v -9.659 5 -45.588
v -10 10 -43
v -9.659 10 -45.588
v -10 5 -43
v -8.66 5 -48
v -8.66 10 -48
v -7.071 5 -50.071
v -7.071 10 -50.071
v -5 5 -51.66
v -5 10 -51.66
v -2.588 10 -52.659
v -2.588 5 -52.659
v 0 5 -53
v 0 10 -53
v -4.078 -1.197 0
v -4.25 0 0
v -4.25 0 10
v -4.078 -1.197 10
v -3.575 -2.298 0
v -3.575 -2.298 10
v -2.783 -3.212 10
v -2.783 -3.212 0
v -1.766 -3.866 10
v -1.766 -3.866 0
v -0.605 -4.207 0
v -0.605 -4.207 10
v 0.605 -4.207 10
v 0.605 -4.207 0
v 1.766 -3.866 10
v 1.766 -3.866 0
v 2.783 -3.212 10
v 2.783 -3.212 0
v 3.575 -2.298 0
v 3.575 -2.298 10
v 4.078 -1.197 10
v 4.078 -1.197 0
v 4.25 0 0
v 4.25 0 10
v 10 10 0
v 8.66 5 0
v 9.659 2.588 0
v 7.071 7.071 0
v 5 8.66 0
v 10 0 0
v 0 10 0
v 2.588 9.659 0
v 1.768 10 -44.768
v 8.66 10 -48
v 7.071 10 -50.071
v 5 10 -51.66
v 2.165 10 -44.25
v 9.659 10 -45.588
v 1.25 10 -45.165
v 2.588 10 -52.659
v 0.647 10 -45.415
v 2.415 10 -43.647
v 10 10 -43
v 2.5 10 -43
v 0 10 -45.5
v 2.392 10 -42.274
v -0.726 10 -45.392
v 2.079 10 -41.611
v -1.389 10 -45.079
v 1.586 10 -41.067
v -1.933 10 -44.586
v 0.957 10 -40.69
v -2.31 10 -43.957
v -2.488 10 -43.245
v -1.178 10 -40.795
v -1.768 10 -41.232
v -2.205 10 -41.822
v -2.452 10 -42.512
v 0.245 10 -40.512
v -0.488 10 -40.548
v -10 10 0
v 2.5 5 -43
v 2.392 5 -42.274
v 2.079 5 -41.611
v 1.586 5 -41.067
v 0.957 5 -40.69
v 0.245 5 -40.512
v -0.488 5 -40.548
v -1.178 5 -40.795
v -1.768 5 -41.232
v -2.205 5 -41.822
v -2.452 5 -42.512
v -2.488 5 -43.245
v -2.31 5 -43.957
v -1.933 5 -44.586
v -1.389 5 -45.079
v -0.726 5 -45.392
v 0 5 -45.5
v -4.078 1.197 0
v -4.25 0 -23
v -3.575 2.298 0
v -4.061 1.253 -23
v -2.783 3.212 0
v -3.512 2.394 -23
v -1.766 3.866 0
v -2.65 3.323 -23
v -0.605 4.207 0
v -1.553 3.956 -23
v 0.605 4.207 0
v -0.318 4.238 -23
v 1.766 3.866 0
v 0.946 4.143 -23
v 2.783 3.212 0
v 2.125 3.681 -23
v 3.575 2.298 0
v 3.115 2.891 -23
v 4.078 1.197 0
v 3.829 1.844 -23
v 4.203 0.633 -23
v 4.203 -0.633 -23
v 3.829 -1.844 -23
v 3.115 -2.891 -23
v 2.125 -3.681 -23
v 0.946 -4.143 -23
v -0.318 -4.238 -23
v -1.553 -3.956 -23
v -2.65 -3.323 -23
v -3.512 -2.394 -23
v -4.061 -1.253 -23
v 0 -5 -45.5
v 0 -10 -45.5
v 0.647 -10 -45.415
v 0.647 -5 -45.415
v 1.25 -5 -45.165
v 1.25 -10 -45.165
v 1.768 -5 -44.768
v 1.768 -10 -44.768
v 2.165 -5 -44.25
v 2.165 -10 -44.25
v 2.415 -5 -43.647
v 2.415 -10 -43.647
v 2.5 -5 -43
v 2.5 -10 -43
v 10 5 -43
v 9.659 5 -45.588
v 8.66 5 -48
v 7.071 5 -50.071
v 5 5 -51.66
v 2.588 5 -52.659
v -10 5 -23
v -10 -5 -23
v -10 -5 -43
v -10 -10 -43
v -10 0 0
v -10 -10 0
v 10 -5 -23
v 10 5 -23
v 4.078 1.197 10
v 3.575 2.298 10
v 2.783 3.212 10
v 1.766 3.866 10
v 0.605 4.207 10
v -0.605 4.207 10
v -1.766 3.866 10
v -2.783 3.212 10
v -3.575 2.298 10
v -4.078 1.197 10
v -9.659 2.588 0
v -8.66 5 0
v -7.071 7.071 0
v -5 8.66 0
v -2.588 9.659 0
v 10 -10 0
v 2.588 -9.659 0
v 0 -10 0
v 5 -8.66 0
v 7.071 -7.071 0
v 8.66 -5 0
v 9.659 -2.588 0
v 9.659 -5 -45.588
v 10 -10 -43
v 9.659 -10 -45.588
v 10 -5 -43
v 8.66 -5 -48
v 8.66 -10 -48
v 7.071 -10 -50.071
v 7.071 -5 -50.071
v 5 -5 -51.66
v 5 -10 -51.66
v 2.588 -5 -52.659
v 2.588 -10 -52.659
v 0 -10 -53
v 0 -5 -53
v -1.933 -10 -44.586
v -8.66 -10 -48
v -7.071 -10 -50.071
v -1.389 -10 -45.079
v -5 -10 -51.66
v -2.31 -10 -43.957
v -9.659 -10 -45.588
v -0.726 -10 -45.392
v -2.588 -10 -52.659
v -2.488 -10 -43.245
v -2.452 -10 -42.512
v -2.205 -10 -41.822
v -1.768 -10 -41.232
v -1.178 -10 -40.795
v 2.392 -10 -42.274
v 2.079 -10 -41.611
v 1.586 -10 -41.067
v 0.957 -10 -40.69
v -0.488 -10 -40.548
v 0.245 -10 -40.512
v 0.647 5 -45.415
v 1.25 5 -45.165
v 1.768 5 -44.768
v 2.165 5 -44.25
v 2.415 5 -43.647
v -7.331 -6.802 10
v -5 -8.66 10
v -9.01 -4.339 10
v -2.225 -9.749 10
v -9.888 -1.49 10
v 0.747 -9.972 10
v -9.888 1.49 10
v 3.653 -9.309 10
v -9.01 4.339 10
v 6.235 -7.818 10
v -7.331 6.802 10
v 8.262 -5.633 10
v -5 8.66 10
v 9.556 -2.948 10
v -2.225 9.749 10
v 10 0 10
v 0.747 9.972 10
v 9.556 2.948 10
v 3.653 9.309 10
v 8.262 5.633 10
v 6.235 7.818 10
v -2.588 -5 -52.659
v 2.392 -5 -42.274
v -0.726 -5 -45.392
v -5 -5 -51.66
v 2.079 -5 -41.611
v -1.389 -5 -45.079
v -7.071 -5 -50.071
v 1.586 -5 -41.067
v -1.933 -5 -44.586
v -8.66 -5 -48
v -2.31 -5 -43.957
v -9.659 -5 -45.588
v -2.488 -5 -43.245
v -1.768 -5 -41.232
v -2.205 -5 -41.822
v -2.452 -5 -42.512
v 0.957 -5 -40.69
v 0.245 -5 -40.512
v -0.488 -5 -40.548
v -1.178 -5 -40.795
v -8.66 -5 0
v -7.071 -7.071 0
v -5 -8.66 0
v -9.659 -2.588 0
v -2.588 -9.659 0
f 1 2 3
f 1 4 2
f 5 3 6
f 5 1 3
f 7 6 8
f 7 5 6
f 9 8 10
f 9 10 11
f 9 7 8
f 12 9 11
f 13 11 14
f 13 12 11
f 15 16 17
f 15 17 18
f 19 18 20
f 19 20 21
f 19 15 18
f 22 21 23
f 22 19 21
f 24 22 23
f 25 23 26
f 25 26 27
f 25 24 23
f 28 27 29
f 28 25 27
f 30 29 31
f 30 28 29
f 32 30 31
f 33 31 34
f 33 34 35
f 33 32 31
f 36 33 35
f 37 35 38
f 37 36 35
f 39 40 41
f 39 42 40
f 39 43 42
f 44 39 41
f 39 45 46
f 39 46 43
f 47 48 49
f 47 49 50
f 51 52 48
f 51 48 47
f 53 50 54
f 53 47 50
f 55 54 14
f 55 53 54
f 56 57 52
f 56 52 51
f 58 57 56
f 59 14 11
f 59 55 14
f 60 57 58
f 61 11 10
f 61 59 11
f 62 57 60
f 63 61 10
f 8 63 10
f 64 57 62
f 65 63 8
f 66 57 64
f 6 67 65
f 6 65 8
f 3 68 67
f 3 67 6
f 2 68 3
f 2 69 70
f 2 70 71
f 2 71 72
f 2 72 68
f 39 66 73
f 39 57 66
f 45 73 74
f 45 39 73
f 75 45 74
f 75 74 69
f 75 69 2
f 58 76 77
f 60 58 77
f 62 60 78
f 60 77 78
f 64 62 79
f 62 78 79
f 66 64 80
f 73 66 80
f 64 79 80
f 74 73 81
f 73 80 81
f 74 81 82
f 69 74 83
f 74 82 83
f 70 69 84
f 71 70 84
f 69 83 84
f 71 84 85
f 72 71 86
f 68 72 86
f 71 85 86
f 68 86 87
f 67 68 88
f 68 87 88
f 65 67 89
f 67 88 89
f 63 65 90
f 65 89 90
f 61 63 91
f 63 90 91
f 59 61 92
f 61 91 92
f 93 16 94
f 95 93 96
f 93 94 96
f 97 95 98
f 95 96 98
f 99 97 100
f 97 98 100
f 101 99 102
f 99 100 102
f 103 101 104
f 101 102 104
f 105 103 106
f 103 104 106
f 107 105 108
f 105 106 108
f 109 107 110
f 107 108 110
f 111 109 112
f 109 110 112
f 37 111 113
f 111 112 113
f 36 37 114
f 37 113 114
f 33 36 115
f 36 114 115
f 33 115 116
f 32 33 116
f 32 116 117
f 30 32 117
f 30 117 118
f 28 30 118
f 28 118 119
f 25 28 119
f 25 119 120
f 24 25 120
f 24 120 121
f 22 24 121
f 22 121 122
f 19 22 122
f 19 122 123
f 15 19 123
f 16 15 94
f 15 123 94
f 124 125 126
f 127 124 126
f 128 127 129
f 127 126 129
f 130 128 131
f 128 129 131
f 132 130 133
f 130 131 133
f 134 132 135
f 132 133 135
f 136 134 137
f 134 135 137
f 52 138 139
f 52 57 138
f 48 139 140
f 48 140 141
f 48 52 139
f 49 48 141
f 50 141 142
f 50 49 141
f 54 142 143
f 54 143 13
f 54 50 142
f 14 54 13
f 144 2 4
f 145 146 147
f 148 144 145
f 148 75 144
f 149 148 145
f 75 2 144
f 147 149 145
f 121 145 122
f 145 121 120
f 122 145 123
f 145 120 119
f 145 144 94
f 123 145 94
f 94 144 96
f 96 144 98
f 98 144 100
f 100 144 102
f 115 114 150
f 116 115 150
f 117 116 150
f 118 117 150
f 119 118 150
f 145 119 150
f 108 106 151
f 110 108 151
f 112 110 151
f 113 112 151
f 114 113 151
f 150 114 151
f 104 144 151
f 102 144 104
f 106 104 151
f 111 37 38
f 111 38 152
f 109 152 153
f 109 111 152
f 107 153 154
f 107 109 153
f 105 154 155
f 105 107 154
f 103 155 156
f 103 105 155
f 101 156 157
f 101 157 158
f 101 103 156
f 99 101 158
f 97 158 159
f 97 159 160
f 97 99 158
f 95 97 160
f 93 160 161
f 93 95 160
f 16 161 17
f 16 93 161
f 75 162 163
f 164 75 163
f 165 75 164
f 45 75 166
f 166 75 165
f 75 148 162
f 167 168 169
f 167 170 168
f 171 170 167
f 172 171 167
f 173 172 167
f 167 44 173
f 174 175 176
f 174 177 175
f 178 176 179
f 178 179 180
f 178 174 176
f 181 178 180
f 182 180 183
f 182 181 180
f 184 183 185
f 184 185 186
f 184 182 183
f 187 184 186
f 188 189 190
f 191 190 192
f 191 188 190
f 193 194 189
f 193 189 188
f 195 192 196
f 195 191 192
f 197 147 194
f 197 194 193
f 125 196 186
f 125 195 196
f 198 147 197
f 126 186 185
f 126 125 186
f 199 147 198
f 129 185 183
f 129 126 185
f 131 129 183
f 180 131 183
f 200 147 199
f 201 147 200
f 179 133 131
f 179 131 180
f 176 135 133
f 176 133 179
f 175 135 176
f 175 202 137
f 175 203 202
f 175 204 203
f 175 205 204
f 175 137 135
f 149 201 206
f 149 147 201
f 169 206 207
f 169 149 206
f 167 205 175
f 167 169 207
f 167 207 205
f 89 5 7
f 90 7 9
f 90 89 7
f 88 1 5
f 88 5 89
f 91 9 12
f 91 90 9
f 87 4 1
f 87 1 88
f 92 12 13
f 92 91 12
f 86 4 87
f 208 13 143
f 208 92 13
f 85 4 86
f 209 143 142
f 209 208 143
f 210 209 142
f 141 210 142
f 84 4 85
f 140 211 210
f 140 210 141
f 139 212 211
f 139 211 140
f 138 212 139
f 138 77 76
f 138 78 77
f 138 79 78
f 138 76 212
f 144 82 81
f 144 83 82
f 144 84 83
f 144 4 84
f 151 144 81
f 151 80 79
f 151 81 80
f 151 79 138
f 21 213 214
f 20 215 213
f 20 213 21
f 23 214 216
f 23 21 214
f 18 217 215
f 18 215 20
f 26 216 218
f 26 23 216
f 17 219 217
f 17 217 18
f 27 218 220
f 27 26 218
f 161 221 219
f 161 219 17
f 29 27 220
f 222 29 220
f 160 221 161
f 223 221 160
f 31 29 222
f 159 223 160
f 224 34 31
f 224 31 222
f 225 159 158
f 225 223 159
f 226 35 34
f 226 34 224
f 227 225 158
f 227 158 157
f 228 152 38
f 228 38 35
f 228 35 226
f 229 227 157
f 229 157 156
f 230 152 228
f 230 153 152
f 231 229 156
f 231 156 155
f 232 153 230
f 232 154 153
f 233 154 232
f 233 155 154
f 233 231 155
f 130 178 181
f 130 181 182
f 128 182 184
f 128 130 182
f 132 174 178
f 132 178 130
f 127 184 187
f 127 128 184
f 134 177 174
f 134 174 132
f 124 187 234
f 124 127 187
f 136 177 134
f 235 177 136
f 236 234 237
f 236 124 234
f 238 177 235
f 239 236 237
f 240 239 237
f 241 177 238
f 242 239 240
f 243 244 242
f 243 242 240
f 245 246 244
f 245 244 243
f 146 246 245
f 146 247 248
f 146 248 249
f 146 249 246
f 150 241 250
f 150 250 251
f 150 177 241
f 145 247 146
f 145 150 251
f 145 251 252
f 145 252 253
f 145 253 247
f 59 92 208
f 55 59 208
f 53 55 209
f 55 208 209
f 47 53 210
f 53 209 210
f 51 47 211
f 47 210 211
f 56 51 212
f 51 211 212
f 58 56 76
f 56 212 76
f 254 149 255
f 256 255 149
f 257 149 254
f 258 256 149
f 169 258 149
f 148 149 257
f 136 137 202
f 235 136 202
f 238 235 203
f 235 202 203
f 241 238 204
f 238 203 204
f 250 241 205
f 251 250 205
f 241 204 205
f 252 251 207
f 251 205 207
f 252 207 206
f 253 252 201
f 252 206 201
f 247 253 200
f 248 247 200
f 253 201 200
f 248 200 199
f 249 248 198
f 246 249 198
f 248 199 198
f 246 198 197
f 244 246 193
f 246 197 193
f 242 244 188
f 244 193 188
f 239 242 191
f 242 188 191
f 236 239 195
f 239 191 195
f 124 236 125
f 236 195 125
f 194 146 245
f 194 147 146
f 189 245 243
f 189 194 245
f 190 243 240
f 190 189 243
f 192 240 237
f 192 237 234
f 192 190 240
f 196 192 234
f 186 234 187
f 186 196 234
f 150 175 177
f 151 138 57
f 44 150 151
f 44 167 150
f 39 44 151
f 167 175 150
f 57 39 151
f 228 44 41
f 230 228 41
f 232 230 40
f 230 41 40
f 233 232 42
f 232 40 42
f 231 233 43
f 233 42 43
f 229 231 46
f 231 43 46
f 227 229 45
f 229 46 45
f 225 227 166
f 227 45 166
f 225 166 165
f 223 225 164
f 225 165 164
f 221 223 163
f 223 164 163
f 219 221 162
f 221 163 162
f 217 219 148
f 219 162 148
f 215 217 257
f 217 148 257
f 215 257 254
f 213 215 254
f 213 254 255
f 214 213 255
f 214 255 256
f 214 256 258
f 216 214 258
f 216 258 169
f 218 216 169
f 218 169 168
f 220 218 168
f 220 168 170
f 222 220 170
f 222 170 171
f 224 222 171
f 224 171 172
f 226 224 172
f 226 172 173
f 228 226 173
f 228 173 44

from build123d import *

# Parameters (mm, degrees)
F0_R     = 10
F0_R_2   = 4.25
F1_DEPTH = 10
F3_DEPTH = 53
F5_DEPTH = 25
F6_DEPTH = 23
F7_R     = 9.99999
F8_D     = 8.5


# Not quite as in the source:
# - a fillet or chamfer is up to 0.001 mm smaller than in the source, because OpenCascade refuses the exact size
# - a feature names something its author has since deleted; it is built from what else it names


with BuildPart() as f1:
    # F0 (on Top) → F1 (new body)
    with BuildSketch(Plane.XY):
        Circle(F0_R)
        Circle(F0_R_2, mode=Mode.SUBTRACT)
    extrude(amount=F1_DEPTH)

    # F2 (on face) → F3 (join)
    with BuildSketch(Plane.XY):
        with BuildLine():
            ThreePointArc((8.6602540378, -5), (5, -8.6602540378), (0, -10))
            Line((0, -10), (10, -10))
            Line((10, -10), (10, -5))
            Line((10, -5), (8.6602540378, -5))
        make_face()
        with BuildLine():
            ThreePointArc((-8.6602540378, -5), (-5, -8.6602540378), (0, -10))
            ThreePointArc((0, -10), (5, -8.6602540378), (8.6602540378, -5))
            Line((8.6602540378, -5), (-8.6602540378, -5))
        make_face()
        with BuildLine():
            Line((-10, -10), (0, -10))
            ThreePointArc((0, -10), (-5, -8.6602540378), (-8.6602540378, -5))
            Line((-8.6602540378, -5), (-10, -5))
            Line((-10, -5), (-10, -10))
        make_face()
        with BuildLine():
            Line((8.6602540378, 5), (10, 5))
            Line((10, 5), (10, 10))
            Line((10, 10), (-2.67e-08, 10))
            ThreePointArc((-2.67e-08, 10), (4.9999999884, 8.6602540445), (8.6602540378, 5))
        make_face()
        with BuildLine():
            Line((-10, 10), (-10, 5))
            Line((-10, 5), (-8.6602540378, 5))
            ThreePointArc((-8.6602540378, 5), (-5.0000000116, 8.6602540312), (-2.67e-08, 10))
            Line((-2.67e-08, 10), (-10, 10))
        make_face()
        with BuildLine():
            ThreePointArc((-2.67e-08, 10), (-5.0000000116, 8.6602540312), (-8.6602540378, 5))
            Line((-8.6602540378, 5), (8.6602540378, 5))
            ThreePointArc((8.6602540378, 5), (4.9999999884, 8.6602540445), (-2.67e-08, 10))
        make_face()
    extrude(amount=-F3_DEPTH)

    # F4 (on face) → F5 (cut)
    with BuildSketch(Plane.XZ.offset(10)):
        with BuildLine():
            ThreePointArc((2.5, -43), (-1.767766953, -41.232233047), (0, -45.5))
            ThreePointArc((0, -45.5), (1.767766953, -44.767766953), (2.5, -43))
        make_face()
    extrude(amount=-F5_DEPTH, mode=Mode.SUBTRACT)

    # F2 (on face) → F6 (join)
    with BuildSketch(Plane.XY):
        with BuildLine():
            ThreePointArc((4.25, 0), (0, 4.25), (-4.25, 0))
            Line((-4.25, 0), (4.25, 0))
        make_face()
        with BuildLine():
            ThreePointArc((-10, 0), (-9.6592582629, -2.588190451), (-8.6602540378, -5))
            Line((-8.6602540378, -5), (8.6602540378, -5))
            ThreePointArc((8.6602540378, -5), (9.6592582629, -2.588190451), (10, 0))
            Line((10, 0), (4.25, 0))
            ThreePointArc((4.25, 0), (0, -4.25), (-4.25, 0))
            Line((-4.25, 0), (-10, 0))
        make_face()
        with BuildLine():
            ThreePointArc((-8.6602540378, 5), (-9.6592582629, 2.588190451), (-10, 0))
            Line((-10, 0), (-4.25, 0))
            ThreePointArc((-4.25, 0), (0, 4.25), (4.25, 0))
            Line((4.25, 0), (10, 0))
            ThreePointArc((10, 0), (9.6592582629, 2.588190451), (8.6602540378, 5))
            Line((8.6602540378, 5), (-8.6602540378, 5))
        make_face()
        with BuildLine():
            Line((-10, 5), (-10, 0))
            ThreePointArc((-10, 0), (-9.6592582629, 2.588190451), (-8.6602540378, 5))
            Line((-8.6602540378, 5), (-10, 5))
        make_face()
        with BuildLine():
            Line((-10, -5), (-8.6602540378, -5))
            ThreePointArc((-8.6602540378, -5), (-9.6592582629, -2.588190451), (-10, 0))
            Line((-10, 0), (-10, -5))
        make_face()
        with BuildLine():
            ThreePointArc((8.6602540378, 5), (9.6592582629, 2.588190451), (10, 0))
            Line((10, 0), (10, 5))
            Line((10, 5), (8.6602540378, 5))
        make_face()
        with BuildLine():
            ThreePointArc((10, 0), (9.6592582629, -2.588190451), (8.6602540378, -5))
            Line((8.6602540378, -5), (10, -5))
            Line((10, -5), (10, 0))
        make_face()
        with BuildLine():
            Line((4.25, 0), (-4.25, 0))
            ThreePointArc((-4.25, 0), (0, -4.25), (4.25, 0))
        make_face()
    extrude(amount=-F6_DEPTH)

    # F7 (radius 10 in the source; OpenCascade refuses exactly that, so slightly less here)
    f7_edges = [f1.edges().sort_by_distance(p)[0] for p in [
        (-10, -7.5, -53),
        (-10, 7.5, -53),
        (10, 7.5, -53),
        (10, -7.5, -53),
    ]]
    fillet(f7_edges, radius=F7_R)

    # F8 (through all)
    with Locations(Plane.XY):
        with Locations((0, 0)):
            Hole(F8_D / 2)


solid = f1.part
